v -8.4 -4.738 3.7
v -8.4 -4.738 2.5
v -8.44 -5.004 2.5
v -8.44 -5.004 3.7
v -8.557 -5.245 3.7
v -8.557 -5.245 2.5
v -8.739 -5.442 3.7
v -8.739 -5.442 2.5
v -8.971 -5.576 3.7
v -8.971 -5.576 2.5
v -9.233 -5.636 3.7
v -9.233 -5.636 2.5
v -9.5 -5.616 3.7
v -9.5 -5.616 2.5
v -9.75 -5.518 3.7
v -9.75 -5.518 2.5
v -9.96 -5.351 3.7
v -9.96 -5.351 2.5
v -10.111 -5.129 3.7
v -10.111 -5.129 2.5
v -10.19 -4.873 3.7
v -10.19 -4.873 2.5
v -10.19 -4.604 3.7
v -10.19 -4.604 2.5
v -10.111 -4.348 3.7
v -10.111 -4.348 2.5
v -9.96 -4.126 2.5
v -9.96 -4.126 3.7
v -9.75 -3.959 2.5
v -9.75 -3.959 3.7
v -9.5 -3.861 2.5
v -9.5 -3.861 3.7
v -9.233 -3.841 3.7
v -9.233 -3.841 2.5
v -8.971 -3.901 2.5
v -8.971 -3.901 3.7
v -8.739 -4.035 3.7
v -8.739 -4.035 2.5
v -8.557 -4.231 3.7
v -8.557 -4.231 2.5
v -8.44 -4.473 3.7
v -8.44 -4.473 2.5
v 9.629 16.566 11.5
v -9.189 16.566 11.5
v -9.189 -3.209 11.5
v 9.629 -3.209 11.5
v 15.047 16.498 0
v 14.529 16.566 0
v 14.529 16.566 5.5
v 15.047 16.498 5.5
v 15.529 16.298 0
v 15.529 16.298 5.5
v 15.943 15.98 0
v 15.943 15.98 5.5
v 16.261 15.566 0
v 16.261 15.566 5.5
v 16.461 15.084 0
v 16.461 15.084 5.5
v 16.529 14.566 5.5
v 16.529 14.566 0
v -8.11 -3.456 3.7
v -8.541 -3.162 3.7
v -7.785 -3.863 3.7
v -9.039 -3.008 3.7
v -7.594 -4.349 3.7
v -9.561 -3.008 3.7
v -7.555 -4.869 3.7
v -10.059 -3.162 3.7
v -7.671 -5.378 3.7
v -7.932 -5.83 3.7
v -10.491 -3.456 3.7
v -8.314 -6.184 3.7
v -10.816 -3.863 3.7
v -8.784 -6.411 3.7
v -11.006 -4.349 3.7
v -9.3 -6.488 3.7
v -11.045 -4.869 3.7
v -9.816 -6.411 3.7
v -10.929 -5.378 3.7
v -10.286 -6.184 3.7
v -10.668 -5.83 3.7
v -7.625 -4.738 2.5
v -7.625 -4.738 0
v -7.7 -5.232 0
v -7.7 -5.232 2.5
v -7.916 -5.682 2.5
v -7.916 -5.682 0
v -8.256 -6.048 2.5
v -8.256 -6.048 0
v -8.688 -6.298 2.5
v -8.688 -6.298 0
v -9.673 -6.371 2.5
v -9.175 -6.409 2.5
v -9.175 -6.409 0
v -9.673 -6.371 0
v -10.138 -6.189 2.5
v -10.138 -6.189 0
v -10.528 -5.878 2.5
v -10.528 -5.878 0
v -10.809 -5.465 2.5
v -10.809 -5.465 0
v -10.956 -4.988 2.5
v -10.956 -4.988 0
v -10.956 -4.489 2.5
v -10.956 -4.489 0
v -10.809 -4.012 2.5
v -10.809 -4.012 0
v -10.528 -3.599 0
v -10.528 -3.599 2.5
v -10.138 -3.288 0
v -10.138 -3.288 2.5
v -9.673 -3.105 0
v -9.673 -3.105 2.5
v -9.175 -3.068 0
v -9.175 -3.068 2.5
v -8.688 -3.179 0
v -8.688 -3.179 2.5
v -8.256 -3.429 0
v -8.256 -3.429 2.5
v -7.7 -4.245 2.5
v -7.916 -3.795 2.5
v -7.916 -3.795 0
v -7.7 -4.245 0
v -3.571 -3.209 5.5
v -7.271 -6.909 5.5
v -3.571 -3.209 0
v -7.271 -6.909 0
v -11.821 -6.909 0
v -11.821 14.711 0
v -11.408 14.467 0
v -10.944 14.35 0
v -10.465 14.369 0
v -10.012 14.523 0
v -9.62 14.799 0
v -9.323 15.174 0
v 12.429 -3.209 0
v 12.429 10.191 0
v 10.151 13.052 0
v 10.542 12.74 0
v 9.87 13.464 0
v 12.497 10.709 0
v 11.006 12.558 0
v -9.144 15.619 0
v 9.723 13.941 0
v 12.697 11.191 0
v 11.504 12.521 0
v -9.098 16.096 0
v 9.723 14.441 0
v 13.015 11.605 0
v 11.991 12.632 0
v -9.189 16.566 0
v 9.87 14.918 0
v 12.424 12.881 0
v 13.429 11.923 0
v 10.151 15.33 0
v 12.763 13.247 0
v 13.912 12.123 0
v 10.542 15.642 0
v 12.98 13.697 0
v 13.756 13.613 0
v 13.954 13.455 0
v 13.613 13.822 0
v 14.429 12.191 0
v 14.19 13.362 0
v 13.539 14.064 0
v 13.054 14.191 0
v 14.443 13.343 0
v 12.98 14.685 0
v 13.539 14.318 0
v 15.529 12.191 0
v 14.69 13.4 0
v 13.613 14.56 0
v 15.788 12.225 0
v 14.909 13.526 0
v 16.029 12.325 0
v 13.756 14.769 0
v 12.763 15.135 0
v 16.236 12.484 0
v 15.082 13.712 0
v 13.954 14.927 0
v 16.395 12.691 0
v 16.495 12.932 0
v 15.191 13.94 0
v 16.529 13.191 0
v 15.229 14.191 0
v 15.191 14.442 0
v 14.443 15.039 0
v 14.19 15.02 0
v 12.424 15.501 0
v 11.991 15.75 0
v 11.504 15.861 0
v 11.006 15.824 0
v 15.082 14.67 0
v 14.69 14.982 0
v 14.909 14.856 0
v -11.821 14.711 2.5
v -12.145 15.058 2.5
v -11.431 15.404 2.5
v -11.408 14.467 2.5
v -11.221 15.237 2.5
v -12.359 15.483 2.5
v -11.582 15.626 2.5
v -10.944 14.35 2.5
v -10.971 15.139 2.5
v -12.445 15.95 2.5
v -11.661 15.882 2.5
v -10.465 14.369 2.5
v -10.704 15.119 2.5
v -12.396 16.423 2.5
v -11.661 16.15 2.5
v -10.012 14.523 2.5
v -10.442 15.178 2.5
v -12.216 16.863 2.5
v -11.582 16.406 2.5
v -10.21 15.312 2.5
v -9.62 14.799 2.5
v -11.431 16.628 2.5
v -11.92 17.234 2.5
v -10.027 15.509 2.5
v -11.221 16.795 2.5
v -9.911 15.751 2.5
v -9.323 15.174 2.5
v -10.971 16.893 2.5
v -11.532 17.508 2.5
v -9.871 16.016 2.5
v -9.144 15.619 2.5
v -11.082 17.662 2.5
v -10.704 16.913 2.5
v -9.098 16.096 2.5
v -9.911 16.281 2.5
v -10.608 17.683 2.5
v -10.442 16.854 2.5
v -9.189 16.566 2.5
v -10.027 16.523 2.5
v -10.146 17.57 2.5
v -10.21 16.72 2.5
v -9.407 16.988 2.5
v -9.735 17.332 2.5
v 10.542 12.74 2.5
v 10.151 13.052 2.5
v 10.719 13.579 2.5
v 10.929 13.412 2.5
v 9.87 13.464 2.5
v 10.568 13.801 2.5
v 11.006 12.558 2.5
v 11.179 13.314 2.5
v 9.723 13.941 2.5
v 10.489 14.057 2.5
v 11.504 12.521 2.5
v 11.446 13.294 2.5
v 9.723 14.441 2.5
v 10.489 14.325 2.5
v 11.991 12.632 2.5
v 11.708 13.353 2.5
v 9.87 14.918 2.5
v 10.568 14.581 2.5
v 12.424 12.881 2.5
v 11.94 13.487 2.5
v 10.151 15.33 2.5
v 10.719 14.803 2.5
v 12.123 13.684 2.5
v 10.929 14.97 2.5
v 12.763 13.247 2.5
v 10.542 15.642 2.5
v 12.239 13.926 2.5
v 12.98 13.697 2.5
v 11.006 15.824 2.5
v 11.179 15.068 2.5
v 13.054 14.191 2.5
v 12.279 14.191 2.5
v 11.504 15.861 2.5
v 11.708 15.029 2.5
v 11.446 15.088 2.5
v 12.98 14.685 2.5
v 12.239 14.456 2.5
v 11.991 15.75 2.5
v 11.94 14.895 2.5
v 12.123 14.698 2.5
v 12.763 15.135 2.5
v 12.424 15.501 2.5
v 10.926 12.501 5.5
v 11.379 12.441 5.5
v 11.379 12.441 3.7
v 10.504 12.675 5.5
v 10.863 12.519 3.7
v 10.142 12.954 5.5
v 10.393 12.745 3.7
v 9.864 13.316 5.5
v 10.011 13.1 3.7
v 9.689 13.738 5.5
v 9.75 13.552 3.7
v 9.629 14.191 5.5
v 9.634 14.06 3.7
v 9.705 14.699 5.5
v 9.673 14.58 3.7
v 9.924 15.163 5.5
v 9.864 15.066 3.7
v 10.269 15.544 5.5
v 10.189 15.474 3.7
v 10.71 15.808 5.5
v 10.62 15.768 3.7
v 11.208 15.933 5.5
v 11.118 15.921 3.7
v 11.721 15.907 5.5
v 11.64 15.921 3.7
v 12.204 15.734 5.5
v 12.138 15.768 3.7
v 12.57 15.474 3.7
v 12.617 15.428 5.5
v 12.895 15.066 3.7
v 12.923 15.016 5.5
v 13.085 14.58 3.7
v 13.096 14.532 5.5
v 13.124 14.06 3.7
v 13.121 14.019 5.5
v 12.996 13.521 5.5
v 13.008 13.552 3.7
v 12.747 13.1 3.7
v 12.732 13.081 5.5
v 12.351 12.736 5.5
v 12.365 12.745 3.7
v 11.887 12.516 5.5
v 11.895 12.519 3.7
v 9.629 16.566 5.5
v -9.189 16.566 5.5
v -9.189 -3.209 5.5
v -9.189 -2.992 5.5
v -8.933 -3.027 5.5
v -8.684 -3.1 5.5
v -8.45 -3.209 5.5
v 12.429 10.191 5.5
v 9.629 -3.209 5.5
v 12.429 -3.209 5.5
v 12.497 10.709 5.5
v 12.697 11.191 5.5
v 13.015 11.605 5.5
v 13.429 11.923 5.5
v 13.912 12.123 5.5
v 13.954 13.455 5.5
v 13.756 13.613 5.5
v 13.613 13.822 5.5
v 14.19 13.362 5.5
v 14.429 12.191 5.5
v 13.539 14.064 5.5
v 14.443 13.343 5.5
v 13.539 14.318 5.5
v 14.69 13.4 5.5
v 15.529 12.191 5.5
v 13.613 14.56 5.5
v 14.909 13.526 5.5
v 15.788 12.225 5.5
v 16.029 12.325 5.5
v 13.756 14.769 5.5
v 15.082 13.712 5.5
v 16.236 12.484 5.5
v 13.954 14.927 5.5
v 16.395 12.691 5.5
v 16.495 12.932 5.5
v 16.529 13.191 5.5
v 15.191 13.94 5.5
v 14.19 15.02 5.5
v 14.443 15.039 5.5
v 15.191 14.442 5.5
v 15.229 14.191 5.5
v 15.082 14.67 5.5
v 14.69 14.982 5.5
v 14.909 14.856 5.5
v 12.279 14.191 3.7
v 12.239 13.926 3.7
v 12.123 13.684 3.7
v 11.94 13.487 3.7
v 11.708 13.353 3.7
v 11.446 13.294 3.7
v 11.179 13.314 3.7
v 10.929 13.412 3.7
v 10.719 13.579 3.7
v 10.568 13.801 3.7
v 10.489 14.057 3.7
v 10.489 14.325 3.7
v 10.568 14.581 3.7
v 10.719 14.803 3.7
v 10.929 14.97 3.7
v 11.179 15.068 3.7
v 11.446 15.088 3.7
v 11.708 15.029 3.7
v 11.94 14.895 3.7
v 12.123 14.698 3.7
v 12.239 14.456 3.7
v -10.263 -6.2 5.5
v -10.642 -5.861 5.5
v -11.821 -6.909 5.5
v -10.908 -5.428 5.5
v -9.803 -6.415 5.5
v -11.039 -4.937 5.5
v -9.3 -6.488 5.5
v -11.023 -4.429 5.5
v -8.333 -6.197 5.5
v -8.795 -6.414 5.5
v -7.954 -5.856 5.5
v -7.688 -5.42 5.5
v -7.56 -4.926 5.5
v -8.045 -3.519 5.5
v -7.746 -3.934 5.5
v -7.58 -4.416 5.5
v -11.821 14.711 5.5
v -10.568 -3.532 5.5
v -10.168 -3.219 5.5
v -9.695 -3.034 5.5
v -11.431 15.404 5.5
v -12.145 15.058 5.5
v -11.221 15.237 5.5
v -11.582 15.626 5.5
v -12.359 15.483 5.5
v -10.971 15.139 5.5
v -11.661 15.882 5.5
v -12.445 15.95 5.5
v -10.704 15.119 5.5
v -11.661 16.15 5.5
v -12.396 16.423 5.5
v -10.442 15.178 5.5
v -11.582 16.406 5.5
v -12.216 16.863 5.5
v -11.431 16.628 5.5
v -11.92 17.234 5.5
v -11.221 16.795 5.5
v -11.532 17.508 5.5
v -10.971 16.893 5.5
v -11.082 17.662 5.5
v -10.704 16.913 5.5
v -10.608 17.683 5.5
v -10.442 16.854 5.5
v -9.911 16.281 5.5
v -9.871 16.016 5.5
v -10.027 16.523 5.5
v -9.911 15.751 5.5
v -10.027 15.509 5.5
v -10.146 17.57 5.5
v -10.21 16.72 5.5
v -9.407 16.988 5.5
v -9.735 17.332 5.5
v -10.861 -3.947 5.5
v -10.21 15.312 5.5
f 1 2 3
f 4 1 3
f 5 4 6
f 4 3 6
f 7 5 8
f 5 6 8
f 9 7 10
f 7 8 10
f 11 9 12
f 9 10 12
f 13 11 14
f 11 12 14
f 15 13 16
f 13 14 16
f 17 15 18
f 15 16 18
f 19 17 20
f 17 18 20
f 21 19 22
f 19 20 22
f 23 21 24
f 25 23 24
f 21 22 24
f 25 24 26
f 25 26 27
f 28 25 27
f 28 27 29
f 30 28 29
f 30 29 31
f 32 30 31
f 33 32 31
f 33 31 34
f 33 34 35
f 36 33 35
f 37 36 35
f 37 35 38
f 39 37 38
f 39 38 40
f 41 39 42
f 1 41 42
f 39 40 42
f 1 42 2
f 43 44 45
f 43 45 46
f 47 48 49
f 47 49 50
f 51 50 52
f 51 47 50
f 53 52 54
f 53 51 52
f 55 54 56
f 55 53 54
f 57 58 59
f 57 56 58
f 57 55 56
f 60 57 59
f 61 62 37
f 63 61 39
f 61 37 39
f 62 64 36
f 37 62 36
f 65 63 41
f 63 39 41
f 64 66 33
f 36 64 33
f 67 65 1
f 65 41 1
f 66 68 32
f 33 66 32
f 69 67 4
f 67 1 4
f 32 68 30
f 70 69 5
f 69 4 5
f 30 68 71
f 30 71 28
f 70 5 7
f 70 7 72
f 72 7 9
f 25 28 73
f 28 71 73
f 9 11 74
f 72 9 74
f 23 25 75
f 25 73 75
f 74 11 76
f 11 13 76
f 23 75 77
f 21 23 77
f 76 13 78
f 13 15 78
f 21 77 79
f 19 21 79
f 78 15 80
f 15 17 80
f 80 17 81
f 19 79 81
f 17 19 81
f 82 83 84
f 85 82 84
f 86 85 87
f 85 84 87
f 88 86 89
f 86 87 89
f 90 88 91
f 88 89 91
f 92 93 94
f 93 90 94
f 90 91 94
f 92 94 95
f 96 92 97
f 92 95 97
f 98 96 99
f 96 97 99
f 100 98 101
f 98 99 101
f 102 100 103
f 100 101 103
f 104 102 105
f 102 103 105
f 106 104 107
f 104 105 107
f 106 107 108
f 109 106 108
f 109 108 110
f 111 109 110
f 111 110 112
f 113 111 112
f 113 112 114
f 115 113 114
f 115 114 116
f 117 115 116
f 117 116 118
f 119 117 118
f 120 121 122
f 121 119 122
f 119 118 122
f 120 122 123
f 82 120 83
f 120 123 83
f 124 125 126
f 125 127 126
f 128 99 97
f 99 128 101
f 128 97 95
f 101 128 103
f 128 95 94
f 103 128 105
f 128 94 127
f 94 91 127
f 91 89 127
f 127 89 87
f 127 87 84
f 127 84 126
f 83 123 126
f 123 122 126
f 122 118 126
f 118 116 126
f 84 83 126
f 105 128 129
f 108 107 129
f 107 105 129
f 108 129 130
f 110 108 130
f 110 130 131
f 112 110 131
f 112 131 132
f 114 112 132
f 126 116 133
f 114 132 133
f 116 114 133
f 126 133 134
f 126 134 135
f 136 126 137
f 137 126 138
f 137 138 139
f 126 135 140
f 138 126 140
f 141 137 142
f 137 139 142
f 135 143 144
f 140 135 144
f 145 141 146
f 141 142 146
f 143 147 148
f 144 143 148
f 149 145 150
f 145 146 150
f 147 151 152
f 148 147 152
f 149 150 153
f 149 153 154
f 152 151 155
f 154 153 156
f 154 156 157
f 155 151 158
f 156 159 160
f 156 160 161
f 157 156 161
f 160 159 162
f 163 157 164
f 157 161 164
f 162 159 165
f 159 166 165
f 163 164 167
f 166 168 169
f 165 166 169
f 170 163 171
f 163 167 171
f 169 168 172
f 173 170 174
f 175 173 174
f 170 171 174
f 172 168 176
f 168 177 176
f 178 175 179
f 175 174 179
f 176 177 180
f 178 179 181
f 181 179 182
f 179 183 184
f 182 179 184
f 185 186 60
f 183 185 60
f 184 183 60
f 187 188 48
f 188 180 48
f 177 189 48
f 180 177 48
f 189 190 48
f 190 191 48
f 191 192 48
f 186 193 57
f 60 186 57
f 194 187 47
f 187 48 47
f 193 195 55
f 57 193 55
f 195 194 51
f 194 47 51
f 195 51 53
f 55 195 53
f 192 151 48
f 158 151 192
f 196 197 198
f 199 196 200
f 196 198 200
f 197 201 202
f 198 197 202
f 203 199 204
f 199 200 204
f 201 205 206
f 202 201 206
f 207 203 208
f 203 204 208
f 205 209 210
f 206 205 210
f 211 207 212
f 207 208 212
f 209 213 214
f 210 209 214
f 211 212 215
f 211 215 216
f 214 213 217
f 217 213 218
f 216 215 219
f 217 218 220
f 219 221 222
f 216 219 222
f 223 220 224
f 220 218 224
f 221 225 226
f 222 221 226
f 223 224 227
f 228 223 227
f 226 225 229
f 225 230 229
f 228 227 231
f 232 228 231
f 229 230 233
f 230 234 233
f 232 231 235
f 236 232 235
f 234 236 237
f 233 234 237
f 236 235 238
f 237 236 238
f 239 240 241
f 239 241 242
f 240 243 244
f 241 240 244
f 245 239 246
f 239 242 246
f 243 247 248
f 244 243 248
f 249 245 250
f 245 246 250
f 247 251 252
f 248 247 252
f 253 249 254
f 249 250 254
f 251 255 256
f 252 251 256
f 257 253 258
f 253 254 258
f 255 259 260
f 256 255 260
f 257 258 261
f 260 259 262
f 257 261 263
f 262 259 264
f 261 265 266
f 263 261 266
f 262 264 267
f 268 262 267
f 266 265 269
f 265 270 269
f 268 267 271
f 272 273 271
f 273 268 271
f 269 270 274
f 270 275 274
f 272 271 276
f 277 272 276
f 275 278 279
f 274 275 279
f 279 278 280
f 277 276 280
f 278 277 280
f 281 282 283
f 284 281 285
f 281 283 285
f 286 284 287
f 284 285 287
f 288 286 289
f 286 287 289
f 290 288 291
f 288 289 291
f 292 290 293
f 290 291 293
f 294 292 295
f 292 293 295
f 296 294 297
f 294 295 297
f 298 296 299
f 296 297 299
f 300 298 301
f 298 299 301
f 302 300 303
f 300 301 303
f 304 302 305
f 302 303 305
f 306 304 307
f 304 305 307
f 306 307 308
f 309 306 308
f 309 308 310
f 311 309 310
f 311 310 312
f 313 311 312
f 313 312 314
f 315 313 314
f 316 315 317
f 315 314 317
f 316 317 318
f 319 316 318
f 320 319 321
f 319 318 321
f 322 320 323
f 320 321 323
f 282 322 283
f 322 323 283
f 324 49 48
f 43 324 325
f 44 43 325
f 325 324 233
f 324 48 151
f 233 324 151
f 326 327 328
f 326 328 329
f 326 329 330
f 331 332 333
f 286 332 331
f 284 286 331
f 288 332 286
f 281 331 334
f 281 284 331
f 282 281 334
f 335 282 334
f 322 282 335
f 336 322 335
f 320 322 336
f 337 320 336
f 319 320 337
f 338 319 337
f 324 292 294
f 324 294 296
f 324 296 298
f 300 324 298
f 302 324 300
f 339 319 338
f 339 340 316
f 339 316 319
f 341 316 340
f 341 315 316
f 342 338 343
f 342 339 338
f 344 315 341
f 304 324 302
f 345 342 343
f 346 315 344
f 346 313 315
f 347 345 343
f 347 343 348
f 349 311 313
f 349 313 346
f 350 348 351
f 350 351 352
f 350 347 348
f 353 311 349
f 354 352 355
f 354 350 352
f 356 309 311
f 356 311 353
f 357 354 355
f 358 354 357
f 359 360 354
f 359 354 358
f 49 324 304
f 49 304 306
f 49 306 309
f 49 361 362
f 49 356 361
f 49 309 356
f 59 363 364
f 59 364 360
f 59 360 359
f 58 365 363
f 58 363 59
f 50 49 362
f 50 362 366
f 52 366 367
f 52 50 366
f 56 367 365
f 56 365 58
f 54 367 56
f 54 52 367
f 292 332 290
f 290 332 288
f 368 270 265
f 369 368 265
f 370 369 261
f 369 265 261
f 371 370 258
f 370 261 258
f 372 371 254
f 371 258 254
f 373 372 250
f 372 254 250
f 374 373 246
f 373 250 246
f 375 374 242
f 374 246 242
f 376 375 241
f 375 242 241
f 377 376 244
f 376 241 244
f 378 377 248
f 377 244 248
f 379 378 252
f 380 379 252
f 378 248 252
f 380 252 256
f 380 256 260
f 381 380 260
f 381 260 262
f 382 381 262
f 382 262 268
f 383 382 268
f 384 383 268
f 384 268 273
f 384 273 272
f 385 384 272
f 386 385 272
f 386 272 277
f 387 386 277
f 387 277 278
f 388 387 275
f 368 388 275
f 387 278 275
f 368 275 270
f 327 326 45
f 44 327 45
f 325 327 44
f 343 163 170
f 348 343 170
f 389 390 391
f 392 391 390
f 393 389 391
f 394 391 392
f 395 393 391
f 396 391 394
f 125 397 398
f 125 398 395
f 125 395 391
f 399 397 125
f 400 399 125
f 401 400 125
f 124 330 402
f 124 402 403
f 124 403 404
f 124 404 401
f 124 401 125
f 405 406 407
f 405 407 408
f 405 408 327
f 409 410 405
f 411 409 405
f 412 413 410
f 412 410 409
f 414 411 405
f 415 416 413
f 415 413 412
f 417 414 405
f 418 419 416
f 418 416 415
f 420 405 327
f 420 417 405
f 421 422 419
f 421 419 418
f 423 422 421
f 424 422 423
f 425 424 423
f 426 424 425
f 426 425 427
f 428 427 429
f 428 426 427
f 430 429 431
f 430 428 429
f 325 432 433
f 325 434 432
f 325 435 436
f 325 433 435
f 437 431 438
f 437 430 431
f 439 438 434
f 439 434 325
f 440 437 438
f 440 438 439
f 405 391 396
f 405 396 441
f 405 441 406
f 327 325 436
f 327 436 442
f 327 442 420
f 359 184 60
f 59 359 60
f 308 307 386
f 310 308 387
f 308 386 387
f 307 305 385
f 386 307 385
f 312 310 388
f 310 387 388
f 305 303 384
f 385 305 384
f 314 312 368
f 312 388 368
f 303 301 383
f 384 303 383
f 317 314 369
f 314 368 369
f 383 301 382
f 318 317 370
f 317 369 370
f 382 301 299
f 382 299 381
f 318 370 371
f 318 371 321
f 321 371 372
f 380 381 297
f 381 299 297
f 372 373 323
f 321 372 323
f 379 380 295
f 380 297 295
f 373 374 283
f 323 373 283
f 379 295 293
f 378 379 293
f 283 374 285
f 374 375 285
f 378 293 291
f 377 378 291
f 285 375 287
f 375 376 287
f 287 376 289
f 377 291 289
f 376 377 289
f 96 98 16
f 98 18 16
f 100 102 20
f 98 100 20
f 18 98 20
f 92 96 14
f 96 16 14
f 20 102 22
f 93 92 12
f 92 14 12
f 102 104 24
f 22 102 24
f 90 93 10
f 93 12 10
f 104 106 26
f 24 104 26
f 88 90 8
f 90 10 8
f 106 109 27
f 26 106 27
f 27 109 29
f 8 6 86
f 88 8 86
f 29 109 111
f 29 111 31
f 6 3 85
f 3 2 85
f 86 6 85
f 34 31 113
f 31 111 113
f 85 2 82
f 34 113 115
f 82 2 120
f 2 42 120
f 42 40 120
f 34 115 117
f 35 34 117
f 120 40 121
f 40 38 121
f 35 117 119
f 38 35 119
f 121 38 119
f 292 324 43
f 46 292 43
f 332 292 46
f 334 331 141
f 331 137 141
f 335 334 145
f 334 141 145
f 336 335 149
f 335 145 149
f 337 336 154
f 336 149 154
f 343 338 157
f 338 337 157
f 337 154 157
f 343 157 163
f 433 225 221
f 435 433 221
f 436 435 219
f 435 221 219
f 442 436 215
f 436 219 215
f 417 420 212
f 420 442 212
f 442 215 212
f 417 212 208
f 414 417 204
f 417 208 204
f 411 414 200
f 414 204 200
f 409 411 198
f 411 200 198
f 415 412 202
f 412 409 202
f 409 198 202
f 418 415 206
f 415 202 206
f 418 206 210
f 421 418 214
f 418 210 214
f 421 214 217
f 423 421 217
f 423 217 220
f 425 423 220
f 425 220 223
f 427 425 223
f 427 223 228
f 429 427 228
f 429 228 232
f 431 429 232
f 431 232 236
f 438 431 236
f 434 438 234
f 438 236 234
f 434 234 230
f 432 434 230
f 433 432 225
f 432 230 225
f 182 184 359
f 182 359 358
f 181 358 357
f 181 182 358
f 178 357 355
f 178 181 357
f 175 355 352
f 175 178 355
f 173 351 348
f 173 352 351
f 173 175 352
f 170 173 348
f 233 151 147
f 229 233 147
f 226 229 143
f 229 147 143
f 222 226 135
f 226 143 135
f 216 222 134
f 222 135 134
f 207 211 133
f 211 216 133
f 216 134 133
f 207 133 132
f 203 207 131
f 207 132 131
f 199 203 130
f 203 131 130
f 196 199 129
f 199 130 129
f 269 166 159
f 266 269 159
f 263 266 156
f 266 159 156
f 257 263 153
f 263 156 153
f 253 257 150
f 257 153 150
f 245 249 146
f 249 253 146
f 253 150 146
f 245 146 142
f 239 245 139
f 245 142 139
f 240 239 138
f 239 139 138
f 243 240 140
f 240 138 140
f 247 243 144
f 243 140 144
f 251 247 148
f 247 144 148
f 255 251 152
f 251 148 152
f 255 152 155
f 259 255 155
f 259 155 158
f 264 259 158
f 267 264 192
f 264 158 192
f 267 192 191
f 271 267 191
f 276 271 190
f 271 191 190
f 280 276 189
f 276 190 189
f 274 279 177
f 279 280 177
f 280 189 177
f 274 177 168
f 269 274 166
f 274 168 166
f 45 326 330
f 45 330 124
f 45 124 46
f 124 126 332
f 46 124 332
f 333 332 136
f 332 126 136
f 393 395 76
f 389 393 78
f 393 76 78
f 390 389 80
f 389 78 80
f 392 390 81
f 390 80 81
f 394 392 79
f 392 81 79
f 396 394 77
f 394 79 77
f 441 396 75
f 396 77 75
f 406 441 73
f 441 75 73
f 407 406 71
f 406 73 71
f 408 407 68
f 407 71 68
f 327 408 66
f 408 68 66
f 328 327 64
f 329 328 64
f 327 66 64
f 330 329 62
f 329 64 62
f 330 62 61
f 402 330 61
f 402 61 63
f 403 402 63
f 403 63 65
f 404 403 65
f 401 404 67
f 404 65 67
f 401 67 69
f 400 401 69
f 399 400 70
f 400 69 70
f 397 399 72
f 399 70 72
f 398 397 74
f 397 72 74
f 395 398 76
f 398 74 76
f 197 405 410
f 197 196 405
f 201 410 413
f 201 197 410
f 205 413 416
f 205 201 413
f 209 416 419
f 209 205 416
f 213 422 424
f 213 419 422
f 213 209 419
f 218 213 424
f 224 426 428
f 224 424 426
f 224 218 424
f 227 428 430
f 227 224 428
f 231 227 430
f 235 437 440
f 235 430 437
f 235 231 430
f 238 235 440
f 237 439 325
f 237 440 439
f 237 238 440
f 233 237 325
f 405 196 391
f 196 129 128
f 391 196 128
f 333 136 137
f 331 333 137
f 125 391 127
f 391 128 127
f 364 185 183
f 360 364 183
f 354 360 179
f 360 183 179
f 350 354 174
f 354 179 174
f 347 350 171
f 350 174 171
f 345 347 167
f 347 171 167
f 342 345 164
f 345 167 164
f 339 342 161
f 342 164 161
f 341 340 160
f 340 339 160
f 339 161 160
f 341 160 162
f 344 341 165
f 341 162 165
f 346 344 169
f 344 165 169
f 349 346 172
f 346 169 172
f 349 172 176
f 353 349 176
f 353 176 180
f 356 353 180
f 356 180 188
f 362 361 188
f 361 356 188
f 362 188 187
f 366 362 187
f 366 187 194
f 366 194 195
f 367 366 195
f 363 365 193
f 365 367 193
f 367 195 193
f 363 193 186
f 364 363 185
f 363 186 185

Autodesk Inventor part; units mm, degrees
ref_plane "YZ Plane" through (0, 0, 0) normal (1, 0, 0) x (0, 1, 0)
ref_plane "XZ Plane" through (0, 0, 0) normal (0, 1, 0) x (-1, 0, 0)
sketch "Skizze1" plane through (0, 0, 0) normal (0, 0, 1) x (1, 0, 0)
  line L0 (14.1792, -17.284) -> (14.1792, 17.716)
  line L1 (14.1792, 17.716) -> (-11.8208, 17.716)
  line L2 (-11.8208, 17.716) -> (-11.8208, -17.284)
  line L3 (-11.8208, -17.284) -> (14.1792, -17.284)
  line L4 (14.1792, -17.284) -> (-11.8208, 17.716) construction
  line L5 (14.1792, 17.716) -> (-11.8208, -17.284) construction
  line L6 (3.4292, 10.341) -> (-6.0708, 10.341) construction
  line L7 (3.4292, 3.091) -> (3.4292, 10.341) construction
  line L8 (-6.0708, 3.091) -> (3.4292, 3.091) construction
  line L9 (-6.0708, 10.341) -> (-6.0708, 3.091) construction
  line L10 (3.4292, 10.341) -> (-6.0708, 3.091) construction
  line L11 (3.4292, 3.091) -> (-6.0708, 10.341) construction
  point P0 (0, 0)
  point P1 (1.1792, 0.216)
  point P2 (1.1792, 0.216)
  point P3 (-1.3208, 6.716)
  point P4 (-1.3208, 6.716)
  point P5 (1.1792, 0.216)
  point P6 (-1.3208, 6.716)
  dimension "d0" = 26
  dimension "d1" = 35
  dimension "d2" = 11
  dimension "d3" = 2.5
sketch "Skizze2" plane through (0, 0, 0) normal (0, 0, 1) x (1, 0, 0)
  line L0 (-3.4208, 1.091) -> (-7.8208, 1.091) projected
  line L1 (-7.8208, 1.091) -> (-7.8208, 12.341) projected
  line L2 (-7.8208, 12.341) -> (-3.4208, 12.341) projected
  line L3 (5.1792, 1.091) -> (0.7792, 1.091) projected
  line L4 (5.1792, 12.341) -> (5.1792, 1.091) projected
  line L5 (0.7792, 12.341) -> (5.1792, 12.341) projected
  circle A0 centre (-9.3002, -4.7384) radius 1.575 construction
  circle A1 centre (11.3792, 14.191) radius 1.575 construction
  circle A2 centre (-9.3002, -4.7384) radius 0.7 construction
  circle A3 centre (-10.7708, 16.016) radius 0.7 construction
  circle A4 centre (11.3792, 14.191) radius 0.7 construction
  line L6 (-3.4208, 12.341) -> (-3.4208, 13.366) projected
  line L7 (-3.4208, 13.366) -> (0.7792, 13.366) projected
  line L8 (0.7792, 0.066) -> (-3.4208, 0.066) projected
  line L9 (-3.4208, 0.066) -> (-3.4208, 1.091) projected
  line L10 (0.7792, 1.091) -> (0.7792, 0.066) projected
  line L11 (0.7792, 13.366) -> (0.7792, 12.341) projected
  line L12 (-12.2708, -9.259) -> (-12.2708, 10.741) construction
  line L13 (14.5292, 16.566) -> (-9.295, 16.566) construction
  arc A5 (16.5292, 14.566) -> (14.5292, 16.566) centre (14.5292, 14.566) ccw projected
  line L14 (16.5292, 14.566) -> (16.5292, 13.191) projected
  arc A6 (15.5292, 12.191) -> (16.5292, 13.191) centre (15.5292, 13.191) ccw projected
  line L15 (15.5292, 12.191) -> (14.4292, 12.191) projected
  arc A7 (14.4292, 12.191) -> (12.4292, 10.191) centre (14.4292, 10.191) ccw projected
  line L16 (12.4292, 10.191) -> (12.4292, -3.209) projected
  line L17 (-3.5708, -3.209) -> (12.4292, -3.209) projected
  line L18 (-8.1002, -7.7384) -> (-3.5708, -3.209) projected
  arc A8 (-10.7708, 17.591) -> (-9.295, 16.566) centre (-10.7708, 16.016) ccw construction
  line L19 (-8.1002, -8.7384) -> (-8.1002, -7.7384) construction
  circle A9 centre (-9.3002, -8.7384) radius 0.75 construction
  circle A10 centre (-9.3002, -8.7384) radius 1.2 construction
  line L20 (-10.8208, -7.909) -> (-11.8208, -6.909) construction
  line L21 (-11.8208, -6.909) -> (-11.8208, 14.7109)
  line L22 (-11.8208, -6.909) -> (-10.4976, -8.2322)
  arc A11 (-8.1002, -8.2384) -> (-8.2864, -7.9246) centre (-9.3002, -8.7384) ccw construction
  line L23 (-8.1002, -8.2384) -> (-8.1002, -7.7384) construction
  circle A12 centre (-9.3002, -4.7384) radius 1.675
  circle A13 centre (11.3792, 14.191) radius 1.675
  line L24 (14.5292, 16.566) -> (-9.1887, 16.566)
  arc A14 (-11.8208, 14.7109) -> (-9.1887, 16.566) centre (-10.7708, 16.016) ccw
  circle A15 centre (14.3792, 14.191) radius 0.75 construction
  circle A16 centre (14.3792, 14.191) radius 0.85
  line L25 (-8.1002, -7.7384) -> (-8.2864, -7.9246) construction
  arc A17 (-8.2864, -7.9246) -> (-10.4976, -8.2322) centre (-9.3002, -8.7384) ccw construction
  line L26 (-11.8208, -6.909) -> (-7.2708, -6.909)
  point P0 (0, 0)
  dimension "d4" = 0.1
  dimension "d5" = 0.1
  dimension "d6" = 0.1
  dimension "d7" = 0.1
  dimension "d10" = 0.1
extrude "Extrusion1" add sketch "Skizze2" along normal blind 2.5 contours L0 L1 L2 L6 L7 L11 L5 L4 L3 L10 L8 L9 | L14 A6 L15 A7 L16 L17 L18 L26 L21 A14 L24 A5
sketch "Skizze3" plane through (0, 0, 2.5) normal (0, 0, 1) x (1, 0, 0)
  circle A0 centre (11.3792, 14.191) radius 1.675 construction
  circle A1 centre (-9.3002, -4.7384) radius 1.675 construction
  circle A2 centre (14.3792, 14.191) radius 0.85 projected
  arc A3 (16.5292, 14.566) -> (14.5292, 16.566) centre (14.5292, 14.566) ccw projected
  line L0 (14.5292, 16.566) -> (-9.1887, 16.566) projected
  arc A4 (-11.8208, 14.7109) -> (-9.1887, 16.566) centre (-10.7708, 16.016) ccw construction
  line L1 (-11.8208, 14.7109) -> (-11.8208, -6.909) projected
  line L2 (-7.2708, -6.909) -> (-3.5708, -3.209) projected
  line L3 (-3.5708, -3.209) -> (12.4292, -3.209) projected
  line L4 (12.4292, -3.209) -> (12.4292, 10.191) projected
  arc A5 (14.4292, 12.191) -> (12.4292, 10.191) centre (14.4292, 10.191) ccw projected
  line L5 (14.4292, 12.191) -> (15.5292, 12.191) projected
  arc A6 (15.5292, 12.191) -> (16.5292, 13.191) centre (15.5292, 13.191) ccw projected
  line L6 (16.5292, 13.191) -> (16.5292, 14.566) projected
  circle A7 centre (11.3792, 14.191) radius 0.7 construction
  circle A8 centre (-9.3002, -4.7384) radius 0.7 construction
  circle A9 centre (-9.3002, -8.7384) radius 0.75 construction
  circle A10 centre (-9.3002, -8.7384) radius 0.85
  line L7 (-8.2864, -7.9246) -> (-3.5708, -3.209) projected
  arc A11 (-10.4976, -8.2322) -> (-8.2864, -7.9246) centre (-9.3002, -8.7384) ccw
  arc A12 (-9.1887, 16.566) -> (-11.8208, 14.7109) centre (-10.7708, 16.016) ccw
  circle A13 centre (-10.7708, 16.016) radius 0.7 construction
  circle A14 centre (-10.7708, 16.016) radius 0.9
  circle A15 centre (11.3792, 14.191) radius 0.9
  circle A16 centre (-9.3002, -4.7384) radius 0.9
  line L8 (-11.8208, -6.909) -> (-7.2708, -6.909) projected
  point P0 (0, 0)
  dimension "d11" = 0.1
  dimension "d13" = 1.8
  dimension "d14" = 1.8
  dimension "d15" = 1.8
ref_plane "Arbeitsebene1" through (-9.7716, -9.2098, 6) normal (0, 0, 1) x (1, 0, 0)
extrude "Extrusion2" add sketch "Skizze3" along normal blind 3 contours L6 A6 L5 A5 L4 L3 L2 L8 L1 A12 L0 A3
sketch "Skizze4" plane through (-9.1887, 16.566, 5.5) normal (0, 0, 1) x (1, 0, 0)
  circle A0 centre (-0.1115, -21.3043) radius 0.7 construction
  circle A1 centre (-1.5821, -0.55) radius 0.7 construction
  circle A2 centre (20.5679, -2.375) radius 0.7 construction
  point P0 (9.1887, -16.566)
hole "Bohrung1" at (-9.3002, -4.7384, 5.5) at (11.3792, 14.191, 5.5) direction (0, 0, -1) diameter 1.8 end through all counterbore diameter 3.5 counterbore depth 1.8 clearance for "Inbusschraube ISO 4762" size "M1.6" standard "ISO"
sketch "Sketch8" plane through (0, 0, 5.5) normal (0, 0, 1) x (1, 0, 0)
  circle A0 centre (-9.3002, -4.7384) radius 1.75 projected
  circle A1 centre (11.3792, 14.191) radius 1.75 projected
  circle A2 centre (-10.7708, 16.016) radius 0.9 projected
  circle A3 centre (14.3792, 14.191) radius 0.85 projected
  arc A4 (16.5292, 14.566) -> (14.5292, 16.566) centre (14.5292, 14.566) ccw projected
  line L0 (14.5292, 16.566) -> (-9.1887, 16.566) projected
  arc A5 (-9.1887, 16.566) -> (-11.8208, 14.7109) centre (-10.7708, 16.016) ccw projected
  line L1 (-11.8208, 14.7109) -> (-11.8208, -6.909) projected
  line L2 (-11.8208, -6.909) -> (-7.2708, -6.909) projected
  line L3 (-7.2708, -6.909) -> (-3.5708, -3.209) projected
  line L4 (-3.5708, -3.209) -> (12.4292, -3.209) projected
  line L5 (12.4292, -3.209) -> (12.4292, 10.191) projected
  arc A6 (14.4292, 12.191) -> (12.4292, 10.191) centre (14.4292, 10.191) ccw projected
  line L6 (14.4292, 12.191) -> (15.5292, 12.191) projected
  arc A7 (15.5292, 12.191) -> (16.5292, 13.191) centre (15.5292, 13.191) ccw projected
  line L7 (16.5292, 13.191) -> (16.5292, 14.566) projected
  line L8 (12.4292, -3.209) -> (-3.5708, -3.209) projected
  line L9 (-9.1887, 16.566) -> (14.5292, 16.566) projected
  line L10 (9.6292, -3.209) -> (-9.1887, -3.209)
  line L11 (-9.1887, -3.209) -> (-9.1887, 16.566)
  line L12 (-9.1887, 16.566) -> (9.6292, 16.566)
  line L13 (9.6292, 16.566) -> (9.6292, -3.209)
  circle A8 centre (11.3792, 14.191) radius 1.75 projected
  point P0 (0, 0)
extrude "Extrusion6" add sketch "Sketch8" along normal blind 6 contours L10 L11 A0 | A0 L11 L0 L13 L4 L10 picked at (-8.7742, -3.1728)
properties part number "Raman2Go_Adapterplatte2_XY-TischChina"
